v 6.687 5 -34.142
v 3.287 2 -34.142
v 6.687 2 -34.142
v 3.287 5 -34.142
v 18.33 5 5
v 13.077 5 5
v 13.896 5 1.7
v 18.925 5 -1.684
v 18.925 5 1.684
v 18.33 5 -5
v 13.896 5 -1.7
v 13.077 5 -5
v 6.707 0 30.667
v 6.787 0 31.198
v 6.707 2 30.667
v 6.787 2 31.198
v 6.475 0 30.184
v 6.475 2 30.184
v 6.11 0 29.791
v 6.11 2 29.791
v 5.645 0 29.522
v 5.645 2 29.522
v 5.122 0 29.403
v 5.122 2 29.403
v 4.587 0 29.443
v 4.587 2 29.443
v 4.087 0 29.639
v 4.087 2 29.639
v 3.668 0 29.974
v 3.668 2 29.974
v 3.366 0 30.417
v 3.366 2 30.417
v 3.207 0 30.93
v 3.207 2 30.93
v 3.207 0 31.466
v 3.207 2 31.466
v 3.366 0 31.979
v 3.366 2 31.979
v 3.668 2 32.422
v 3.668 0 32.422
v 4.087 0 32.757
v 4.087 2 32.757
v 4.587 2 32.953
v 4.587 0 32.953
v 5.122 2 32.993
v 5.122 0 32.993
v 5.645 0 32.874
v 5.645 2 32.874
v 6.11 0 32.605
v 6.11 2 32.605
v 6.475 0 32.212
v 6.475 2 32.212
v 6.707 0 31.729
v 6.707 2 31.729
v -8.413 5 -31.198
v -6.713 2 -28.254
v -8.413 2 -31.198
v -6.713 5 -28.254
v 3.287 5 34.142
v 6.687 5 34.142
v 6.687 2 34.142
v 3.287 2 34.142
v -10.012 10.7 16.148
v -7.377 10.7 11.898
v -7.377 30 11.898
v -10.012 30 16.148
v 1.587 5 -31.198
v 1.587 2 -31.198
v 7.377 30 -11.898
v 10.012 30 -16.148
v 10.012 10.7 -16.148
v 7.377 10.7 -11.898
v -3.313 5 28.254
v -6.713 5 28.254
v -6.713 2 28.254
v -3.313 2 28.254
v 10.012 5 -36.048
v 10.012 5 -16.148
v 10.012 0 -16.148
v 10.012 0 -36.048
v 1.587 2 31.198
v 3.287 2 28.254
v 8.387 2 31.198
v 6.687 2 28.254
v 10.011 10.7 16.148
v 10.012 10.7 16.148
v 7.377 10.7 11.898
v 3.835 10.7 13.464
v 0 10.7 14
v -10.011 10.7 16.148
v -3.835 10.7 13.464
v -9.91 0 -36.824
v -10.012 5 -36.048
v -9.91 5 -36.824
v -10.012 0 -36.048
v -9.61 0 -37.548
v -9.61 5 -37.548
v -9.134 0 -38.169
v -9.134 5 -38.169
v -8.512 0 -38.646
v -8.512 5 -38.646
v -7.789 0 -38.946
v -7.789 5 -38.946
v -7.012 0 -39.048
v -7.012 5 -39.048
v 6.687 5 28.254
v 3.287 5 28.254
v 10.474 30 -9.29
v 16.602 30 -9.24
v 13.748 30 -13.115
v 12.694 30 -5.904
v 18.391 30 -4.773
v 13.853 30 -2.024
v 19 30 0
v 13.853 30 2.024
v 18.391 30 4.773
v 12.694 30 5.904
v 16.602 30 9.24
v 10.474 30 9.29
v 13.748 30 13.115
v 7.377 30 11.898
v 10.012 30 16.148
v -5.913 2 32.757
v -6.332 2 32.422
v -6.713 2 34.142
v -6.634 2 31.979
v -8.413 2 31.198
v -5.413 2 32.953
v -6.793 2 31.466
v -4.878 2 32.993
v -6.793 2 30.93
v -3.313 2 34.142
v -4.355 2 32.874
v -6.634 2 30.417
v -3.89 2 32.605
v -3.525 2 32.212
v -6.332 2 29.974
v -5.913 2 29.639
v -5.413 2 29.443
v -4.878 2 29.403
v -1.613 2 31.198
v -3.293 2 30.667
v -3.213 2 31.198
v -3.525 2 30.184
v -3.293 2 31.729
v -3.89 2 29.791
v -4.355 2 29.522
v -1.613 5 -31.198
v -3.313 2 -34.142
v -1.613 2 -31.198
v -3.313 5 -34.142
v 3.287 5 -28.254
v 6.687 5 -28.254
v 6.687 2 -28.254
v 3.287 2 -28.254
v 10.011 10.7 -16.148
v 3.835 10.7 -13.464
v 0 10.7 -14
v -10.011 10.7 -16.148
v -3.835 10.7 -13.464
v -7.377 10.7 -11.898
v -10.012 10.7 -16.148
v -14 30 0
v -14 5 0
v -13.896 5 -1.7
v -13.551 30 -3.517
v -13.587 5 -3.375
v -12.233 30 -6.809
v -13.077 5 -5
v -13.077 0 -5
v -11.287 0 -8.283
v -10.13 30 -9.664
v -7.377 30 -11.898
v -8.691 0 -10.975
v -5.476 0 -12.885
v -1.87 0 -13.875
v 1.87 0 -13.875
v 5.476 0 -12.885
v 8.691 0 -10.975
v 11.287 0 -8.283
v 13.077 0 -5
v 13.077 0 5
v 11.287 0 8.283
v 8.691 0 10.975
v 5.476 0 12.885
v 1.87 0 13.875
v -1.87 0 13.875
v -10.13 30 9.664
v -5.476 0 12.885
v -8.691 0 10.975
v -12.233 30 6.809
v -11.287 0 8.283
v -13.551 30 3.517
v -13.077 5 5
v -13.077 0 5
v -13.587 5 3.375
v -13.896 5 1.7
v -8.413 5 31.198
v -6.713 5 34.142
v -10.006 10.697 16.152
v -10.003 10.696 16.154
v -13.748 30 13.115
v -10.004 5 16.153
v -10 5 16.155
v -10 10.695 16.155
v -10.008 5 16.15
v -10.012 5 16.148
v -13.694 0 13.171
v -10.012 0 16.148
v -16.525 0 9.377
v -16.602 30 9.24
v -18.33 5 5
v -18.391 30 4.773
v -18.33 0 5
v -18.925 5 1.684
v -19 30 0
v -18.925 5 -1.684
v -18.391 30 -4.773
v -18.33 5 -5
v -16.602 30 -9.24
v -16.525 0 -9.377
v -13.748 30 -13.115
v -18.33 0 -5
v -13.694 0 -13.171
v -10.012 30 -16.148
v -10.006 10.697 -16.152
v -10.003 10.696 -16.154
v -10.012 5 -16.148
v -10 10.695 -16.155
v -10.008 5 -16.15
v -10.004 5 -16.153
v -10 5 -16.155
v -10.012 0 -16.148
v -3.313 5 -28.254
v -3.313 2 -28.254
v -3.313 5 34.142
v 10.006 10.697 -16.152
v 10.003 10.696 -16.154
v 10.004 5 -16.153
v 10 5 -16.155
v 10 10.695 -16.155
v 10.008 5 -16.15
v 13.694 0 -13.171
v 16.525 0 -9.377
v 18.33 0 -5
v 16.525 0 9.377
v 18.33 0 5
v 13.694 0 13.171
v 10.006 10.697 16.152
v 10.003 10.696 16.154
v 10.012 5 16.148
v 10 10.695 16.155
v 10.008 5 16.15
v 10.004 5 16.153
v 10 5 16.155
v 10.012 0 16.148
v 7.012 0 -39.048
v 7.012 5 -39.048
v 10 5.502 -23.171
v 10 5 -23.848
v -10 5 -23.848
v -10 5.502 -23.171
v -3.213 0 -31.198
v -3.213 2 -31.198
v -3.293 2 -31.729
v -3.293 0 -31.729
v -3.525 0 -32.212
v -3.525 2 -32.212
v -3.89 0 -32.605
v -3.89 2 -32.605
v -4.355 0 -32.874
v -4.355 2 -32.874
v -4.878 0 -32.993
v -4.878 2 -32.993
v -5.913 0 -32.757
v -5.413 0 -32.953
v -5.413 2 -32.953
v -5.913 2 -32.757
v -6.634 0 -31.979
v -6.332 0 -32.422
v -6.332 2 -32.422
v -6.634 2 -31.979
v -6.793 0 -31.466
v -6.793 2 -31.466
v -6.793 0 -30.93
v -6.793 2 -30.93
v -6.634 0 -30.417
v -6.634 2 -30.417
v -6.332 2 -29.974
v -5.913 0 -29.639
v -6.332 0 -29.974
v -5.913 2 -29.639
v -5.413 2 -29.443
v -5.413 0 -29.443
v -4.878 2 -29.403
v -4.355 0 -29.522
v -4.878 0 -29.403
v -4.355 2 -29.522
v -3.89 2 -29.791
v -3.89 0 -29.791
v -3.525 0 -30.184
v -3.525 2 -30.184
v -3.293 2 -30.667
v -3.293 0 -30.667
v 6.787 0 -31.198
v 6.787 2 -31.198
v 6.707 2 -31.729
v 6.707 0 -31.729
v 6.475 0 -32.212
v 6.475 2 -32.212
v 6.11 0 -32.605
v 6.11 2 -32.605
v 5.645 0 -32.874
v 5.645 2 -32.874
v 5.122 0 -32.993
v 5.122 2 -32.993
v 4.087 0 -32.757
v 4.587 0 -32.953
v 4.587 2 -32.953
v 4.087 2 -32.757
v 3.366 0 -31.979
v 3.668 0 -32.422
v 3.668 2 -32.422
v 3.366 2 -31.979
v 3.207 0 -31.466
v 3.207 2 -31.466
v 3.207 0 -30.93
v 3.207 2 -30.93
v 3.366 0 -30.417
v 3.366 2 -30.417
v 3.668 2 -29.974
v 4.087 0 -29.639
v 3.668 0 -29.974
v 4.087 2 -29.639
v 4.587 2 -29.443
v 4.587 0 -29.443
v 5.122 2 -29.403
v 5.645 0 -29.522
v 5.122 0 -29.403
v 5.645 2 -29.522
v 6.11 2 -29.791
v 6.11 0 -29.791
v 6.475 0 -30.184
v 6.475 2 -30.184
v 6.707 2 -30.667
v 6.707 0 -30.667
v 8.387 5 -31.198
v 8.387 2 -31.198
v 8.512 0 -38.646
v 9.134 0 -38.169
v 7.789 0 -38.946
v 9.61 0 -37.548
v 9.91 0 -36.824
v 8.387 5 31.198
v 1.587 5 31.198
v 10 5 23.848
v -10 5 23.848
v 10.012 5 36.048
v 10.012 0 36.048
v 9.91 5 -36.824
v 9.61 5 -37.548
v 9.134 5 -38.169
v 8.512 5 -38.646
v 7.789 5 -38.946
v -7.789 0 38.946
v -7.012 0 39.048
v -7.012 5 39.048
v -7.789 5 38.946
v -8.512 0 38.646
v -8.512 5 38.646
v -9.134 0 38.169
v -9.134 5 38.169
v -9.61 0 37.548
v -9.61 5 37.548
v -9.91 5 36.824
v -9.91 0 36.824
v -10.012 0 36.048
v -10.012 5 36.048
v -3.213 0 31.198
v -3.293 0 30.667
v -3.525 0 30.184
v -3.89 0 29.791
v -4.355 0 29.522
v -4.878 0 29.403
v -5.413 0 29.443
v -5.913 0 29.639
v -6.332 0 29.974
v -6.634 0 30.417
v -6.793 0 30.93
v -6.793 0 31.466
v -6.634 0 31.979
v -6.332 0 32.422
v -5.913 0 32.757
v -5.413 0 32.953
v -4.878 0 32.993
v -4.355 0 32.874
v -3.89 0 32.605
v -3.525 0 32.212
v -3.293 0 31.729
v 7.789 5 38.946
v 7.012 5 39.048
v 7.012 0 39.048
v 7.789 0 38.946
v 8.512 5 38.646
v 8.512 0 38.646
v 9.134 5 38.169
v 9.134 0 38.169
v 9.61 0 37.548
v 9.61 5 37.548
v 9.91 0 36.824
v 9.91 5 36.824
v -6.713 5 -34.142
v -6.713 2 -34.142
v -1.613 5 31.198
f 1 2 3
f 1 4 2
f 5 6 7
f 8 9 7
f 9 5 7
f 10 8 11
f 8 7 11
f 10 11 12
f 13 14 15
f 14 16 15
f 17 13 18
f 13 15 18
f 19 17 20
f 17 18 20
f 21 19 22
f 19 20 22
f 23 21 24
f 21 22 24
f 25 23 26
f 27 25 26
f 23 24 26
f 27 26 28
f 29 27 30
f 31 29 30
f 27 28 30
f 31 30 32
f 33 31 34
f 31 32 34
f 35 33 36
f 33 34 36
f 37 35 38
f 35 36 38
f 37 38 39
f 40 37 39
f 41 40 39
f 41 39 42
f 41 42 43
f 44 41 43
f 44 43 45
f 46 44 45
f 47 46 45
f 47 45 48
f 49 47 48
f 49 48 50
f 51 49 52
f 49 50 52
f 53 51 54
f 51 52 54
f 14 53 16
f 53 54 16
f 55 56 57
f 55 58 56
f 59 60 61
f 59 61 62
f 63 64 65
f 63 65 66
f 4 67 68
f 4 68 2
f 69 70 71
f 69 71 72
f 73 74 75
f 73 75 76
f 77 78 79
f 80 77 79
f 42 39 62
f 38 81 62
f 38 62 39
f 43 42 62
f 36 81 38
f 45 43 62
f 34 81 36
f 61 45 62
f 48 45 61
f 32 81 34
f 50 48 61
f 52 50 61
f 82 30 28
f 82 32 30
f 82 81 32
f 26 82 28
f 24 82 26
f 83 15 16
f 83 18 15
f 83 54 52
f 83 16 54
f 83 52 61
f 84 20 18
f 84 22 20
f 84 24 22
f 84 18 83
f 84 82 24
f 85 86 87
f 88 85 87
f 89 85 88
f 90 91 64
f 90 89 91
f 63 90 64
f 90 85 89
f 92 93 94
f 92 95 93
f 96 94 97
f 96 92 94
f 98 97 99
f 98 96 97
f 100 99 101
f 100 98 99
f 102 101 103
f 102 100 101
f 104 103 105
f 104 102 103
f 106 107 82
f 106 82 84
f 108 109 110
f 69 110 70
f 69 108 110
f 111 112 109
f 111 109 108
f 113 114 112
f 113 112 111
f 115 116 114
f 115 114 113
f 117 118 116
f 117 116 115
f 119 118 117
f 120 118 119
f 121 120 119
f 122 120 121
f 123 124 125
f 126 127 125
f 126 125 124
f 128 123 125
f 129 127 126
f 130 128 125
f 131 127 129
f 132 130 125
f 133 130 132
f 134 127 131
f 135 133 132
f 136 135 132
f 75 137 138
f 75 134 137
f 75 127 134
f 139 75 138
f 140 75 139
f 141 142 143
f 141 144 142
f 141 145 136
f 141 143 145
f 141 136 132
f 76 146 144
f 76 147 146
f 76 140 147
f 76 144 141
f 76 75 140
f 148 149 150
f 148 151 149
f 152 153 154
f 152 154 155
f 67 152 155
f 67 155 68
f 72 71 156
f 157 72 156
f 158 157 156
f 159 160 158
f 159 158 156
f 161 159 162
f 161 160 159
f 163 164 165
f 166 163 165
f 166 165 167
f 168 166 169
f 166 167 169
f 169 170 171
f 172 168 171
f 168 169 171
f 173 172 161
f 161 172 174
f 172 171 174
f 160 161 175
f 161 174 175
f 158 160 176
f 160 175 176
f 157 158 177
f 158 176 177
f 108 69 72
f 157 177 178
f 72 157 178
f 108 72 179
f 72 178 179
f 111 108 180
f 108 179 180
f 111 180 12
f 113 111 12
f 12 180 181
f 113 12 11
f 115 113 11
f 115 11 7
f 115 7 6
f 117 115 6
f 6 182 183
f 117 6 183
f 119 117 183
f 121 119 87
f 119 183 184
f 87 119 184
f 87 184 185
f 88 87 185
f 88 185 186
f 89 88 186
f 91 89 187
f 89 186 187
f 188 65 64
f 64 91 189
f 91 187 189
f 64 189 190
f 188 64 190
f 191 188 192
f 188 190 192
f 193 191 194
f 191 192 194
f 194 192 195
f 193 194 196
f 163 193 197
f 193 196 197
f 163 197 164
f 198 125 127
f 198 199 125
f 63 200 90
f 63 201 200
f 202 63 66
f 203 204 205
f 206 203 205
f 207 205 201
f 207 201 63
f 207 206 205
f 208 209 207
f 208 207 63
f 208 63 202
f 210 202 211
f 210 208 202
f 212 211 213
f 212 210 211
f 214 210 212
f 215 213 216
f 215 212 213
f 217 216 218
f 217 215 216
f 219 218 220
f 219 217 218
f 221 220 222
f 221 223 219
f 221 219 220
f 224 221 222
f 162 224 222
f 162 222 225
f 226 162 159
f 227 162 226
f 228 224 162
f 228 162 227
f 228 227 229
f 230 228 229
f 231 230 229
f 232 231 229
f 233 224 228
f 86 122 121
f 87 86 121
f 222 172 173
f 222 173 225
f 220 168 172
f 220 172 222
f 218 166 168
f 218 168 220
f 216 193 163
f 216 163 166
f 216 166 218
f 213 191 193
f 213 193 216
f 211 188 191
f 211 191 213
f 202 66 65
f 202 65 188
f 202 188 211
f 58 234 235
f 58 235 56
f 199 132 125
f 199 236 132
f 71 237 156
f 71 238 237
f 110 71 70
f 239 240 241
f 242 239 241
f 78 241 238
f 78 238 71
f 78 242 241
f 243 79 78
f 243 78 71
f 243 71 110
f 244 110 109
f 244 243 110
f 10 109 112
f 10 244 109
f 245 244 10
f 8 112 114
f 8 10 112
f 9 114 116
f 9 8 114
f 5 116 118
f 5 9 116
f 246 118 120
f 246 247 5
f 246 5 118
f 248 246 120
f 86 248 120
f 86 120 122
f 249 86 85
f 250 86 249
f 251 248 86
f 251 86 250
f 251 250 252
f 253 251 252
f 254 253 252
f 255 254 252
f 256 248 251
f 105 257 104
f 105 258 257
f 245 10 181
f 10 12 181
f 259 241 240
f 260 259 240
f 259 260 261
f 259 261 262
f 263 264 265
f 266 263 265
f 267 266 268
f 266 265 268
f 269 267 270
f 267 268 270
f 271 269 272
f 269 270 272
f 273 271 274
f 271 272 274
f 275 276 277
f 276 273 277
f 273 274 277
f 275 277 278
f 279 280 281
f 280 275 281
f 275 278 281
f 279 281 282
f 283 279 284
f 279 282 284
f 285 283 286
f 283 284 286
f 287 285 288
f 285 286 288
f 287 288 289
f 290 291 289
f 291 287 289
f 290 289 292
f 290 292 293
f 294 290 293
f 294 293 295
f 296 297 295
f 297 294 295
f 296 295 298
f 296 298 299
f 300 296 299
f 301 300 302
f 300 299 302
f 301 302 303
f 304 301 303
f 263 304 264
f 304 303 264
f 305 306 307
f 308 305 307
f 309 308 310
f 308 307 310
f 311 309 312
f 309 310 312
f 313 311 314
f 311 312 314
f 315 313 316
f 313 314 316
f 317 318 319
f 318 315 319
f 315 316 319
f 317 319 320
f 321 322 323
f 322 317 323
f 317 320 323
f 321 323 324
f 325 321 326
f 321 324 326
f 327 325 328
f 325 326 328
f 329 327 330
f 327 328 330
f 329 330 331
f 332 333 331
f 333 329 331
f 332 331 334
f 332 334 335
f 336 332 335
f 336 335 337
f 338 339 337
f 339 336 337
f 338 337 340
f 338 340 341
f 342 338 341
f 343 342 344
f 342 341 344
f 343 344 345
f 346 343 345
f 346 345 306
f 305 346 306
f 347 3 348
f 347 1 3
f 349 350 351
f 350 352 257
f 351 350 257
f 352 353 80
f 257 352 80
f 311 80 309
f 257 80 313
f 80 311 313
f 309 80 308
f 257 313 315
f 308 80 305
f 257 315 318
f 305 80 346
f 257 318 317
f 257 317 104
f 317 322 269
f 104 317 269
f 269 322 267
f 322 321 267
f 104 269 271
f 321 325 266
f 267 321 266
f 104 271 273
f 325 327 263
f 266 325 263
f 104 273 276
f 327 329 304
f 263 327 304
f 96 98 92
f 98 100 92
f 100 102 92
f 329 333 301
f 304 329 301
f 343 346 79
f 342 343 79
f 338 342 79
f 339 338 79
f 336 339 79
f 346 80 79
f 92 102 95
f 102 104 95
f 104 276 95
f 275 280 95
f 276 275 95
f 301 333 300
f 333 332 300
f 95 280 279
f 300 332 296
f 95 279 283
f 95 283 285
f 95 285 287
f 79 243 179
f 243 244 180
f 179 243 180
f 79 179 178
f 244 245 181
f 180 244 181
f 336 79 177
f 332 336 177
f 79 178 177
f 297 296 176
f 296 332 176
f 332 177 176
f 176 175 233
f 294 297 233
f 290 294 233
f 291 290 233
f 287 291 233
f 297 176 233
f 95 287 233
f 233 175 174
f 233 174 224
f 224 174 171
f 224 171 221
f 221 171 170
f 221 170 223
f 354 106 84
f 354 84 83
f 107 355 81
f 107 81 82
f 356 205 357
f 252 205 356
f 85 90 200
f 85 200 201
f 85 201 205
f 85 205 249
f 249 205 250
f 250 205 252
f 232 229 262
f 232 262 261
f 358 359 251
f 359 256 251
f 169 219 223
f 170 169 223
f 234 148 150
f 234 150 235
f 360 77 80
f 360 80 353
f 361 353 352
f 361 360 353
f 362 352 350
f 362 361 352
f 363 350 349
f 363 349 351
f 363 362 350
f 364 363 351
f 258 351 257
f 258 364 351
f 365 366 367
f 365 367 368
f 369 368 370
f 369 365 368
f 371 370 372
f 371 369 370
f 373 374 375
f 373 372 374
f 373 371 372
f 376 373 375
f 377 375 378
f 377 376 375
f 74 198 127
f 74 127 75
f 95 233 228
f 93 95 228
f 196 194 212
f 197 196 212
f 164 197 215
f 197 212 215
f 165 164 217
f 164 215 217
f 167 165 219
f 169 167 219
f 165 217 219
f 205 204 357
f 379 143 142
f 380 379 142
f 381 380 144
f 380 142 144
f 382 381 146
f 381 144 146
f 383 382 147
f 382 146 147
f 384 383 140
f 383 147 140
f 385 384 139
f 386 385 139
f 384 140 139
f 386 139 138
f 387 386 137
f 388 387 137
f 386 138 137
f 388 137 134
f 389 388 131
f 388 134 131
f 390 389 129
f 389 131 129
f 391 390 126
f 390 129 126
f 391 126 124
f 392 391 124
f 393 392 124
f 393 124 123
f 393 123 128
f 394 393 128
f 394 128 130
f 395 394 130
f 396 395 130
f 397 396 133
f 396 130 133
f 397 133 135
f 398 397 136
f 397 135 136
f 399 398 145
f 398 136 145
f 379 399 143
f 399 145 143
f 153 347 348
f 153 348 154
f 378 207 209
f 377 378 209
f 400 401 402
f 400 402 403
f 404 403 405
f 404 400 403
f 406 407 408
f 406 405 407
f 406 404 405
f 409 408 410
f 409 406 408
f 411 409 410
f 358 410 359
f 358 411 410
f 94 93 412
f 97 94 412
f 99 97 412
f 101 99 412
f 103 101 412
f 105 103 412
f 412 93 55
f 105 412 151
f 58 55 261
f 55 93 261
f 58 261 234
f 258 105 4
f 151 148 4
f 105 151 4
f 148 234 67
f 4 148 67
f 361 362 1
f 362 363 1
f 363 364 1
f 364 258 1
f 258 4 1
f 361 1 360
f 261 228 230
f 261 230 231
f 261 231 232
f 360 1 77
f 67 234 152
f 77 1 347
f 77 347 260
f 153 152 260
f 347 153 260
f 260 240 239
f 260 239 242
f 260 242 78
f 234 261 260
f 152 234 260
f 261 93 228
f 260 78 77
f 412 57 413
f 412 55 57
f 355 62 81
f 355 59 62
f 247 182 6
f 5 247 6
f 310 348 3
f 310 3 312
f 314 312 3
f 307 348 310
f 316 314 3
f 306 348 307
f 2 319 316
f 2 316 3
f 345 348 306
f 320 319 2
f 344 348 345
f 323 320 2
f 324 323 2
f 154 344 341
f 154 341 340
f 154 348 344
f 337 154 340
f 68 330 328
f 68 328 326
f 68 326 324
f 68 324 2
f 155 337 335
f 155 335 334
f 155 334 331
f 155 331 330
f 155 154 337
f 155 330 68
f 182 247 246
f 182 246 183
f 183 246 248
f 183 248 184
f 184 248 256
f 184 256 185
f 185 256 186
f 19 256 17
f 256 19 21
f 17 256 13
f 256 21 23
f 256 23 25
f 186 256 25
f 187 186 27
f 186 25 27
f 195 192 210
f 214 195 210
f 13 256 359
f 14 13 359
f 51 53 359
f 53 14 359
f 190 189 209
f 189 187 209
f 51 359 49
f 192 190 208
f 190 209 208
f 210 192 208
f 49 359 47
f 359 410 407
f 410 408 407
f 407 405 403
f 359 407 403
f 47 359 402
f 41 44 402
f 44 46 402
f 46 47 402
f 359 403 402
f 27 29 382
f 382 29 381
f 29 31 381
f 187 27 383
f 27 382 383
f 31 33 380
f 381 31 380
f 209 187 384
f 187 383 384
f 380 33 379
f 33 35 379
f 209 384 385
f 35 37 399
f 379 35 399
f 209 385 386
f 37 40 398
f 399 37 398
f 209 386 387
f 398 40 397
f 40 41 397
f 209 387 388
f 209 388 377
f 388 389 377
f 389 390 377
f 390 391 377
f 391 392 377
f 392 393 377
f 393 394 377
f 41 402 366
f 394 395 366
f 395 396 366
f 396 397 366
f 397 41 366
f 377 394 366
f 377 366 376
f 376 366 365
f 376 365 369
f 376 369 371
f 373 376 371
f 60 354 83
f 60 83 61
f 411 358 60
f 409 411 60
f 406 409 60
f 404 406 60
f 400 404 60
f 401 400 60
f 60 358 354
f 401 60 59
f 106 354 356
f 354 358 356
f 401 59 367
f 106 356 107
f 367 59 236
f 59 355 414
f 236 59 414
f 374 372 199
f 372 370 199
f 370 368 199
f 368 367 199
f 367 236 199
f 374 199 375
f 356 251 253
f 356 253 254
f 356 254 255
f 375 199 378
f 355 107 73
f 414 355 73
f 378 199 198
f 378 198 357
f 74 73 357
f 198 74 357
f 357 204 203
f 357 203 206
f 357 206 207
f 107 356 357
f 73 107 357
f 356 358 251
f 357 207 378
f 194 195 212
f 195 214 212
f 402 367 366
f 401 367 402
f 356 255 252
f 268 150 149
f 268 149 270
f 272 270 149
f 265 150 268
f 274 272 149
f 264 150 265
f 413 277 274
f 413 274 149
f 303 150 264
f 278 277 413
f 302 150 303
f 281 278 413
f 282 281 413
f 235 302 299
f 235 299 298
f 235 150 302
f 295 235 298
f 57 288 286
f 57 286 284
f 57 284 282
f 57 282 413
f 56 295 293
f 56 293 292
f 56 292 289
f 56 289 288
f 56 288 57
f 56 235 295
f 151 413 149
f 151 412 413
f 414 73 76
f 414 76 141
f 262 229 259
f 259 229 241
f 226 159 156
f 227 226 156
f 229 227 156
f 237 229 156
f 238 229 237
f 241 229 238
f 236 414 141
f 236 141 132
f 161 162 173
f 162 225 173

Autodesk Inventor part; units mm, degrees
ref_plane "YZ Plane" through (0, 0, 0) normal (1, 0, 0) x (0, 1, 0)
sketch "Esboço1" plane through (0, 0, 0) normal (0, 1, 0) x (-1, 0, 0)
  circle A0 centre (0, 0) radius 19
  circle A1 centre (0, 0) radius 14
  dimension "d0" = 38
  dimension "d1" = 28
extrude "Extrusão1" add sketch "Esboço1" along normal blind 30
sketch "Esboço2" plane through (0, 0, 0) normal (1, 0, 0) x (0, 1, 0)
  line L0 (-5, 5) -> (5, 5)
  line L1 (5, 5) -> (5, -5)
  line L2 (5, -5) -> (-5, -5)
  line L3 (-5, -5) -> (-5, 5)
  line L4 (-5, 5) -> (5, -5) construction
  line L5 (5, 5) -> (-5, -5) construction
  point P0 (0, 0)
  dimension "d4" = 10
  dimension "d5" = 10
extrude "Extrusão2" cut sketch "Esboço2" along normal mid plane 40
sketch "Esboço3" plane through (0, 0, 0) normal (0, 0, 1) x (1, 0, 0)
  point P0 (0, 0)
ref_plane "Plano de trabalho1" through (0, 30, 0) normal (0, 1, 0) x (-1, 0, 0)
sketch "Esboço4" plane through (0, 30, 0) normal (0, 1, 0) x (-1, 0, 0)
  circle A0 centre (0, 0) radius 19 projected
  line L0 (10.0122, 16.148) -> (-10.0122, -16.148) construction
  line L1 (-10.0122, 16.148) -> (10.0122, -16.148) construction
  circle A1 centre (0, 0) radius 14 projected
  line L2 (7.3774, 11.8985) -> (-7.3774, -11.8985) construction
  line L3 (-7.3774, 11.8985) -> (7.3774, -11.8985) construction
  line L4 (10.0122, -16.148) -> (7.3774, -11.8985)
  line L5 (-10.0122, -16.148) -> (-7.3774, -11.8985)
  line L6 (-10.0122, 16.148) -> (-7.3774, 11.8985)
  line L7 (7.3774, 11.8985) -> (10.0122, 16.148)
  arc A2 (-10.0122, -16.148) -> (10.0122, -16.148) centre (0, 0) ccw
  arc A3 (10.0122, 16.148) -> (-10.0122, 16.148) centre (0, 0) ccw
  arc A4 (7.3774, 11.8985) -> (-7.3774, 11.8985) centre (0, 0) ccw
  arc A5 (-7.3774, -11.8985) -> (7.3774, -11.8985) centre (0, 0) ccw
extrude "Extrusão3" cut sketch "Esboço4" against normal blind 19.3 contours L7 A1 L6 A0 | A0 L5 A1 L4
sketch "Esboço5" plane through (0, 30, 0) normal (0, 1, 0) x (-1, 0, 0)
  point P0 (0, 0)
ref_plane "Plano de trabalho4" through (0, 0, 19) normal (0, 0, 1) x (1, 0, 0)
sketch "Esboço6" plane through (0, 0, 19) normal (0, 0, 1) x (1, 0, 0)
  line L0 (-10.0122, 10.7) -> (-7.3774, 10.7) projected
  line L1 (7.3774, 10.7) -> (10.0122, 10.7) projected
  line L2 (13.0767, 0) -> (-13.0767, 0) projected
  line L3 (10.0122, 0) -> (-10.0122, 0)
  line L4 (-10.0122, 0) -> (10.0122, 0)
  line L5 (10.0122, 0) -> (10.0122, 5)
  line L6 (10.0122, 5) -> (-10.0122, 5)
  line L7 (-10.0122, 5) -> (-10.0122, 0)
  point P0 (0, 0)
  dimension "d20" = 5
extrude "Extrusão4" add sketch "Esboço6" along normal blind 20.048 and the other way blind 3
fillet "Arredondamento1" radius 3 2 edges at (-10.0122, 2.5, 39.048) (10.0122, 2.5, 39.048)
sketch "Esboço7" plane through (0, 0, 0) normal (1, 0, 0) x (0, 1, 0)
  line L0 (10.7, 16.148) -> (10.7, 11.8985) projected
  line L1 (5, 36.048) -> (5, 16.148) projected
  line L2 (10.7, 16.148) -> (5, 16.148)
  line L3 (5, 16.148) -> (5, 23.848)
  line L4 (5, 23.848) -> (10.7, 23.848)
  line L5 (10.7, 23.848) -> (10.7, 16.148)
  point P0 (0, 0)
  dimension "d28" = 7.7
extrude "Extrusão5" add sketch "Esboço7" along normal mid plane 20
chamfer "Chanfro1" distance 5.7 distance2 7.7 1 edges at (0, 10.7, 23.848) measured on face at (-3.3333, 6.9, 23.848)
sketch "Esboço8" plane through (-7.0122, 5, 39.048) normal (0, 1, 0) x (1, 0, 0)
  line L0 (0, 0) -> (14.0243, 0) projected
  line L1 (1.9995, 0) -> (1.9995, 7.85) construction
  line L2 (5.3995, 7.85) -> (3.6995, 4.9055)
  line L3 (3.6995, 4.9055) -> (0.2995, 4.9055)
  line L4 (0.2995, 4.9055) -> (-1.4005, 7.85)
  line L5 (-1.4005, 7.85) -> (0.2995, 10.7945)
  line L6 (0.2995, 10.7945) -> (3.6995, 10.7945)
  line L7 (3.6995, 10.7945) -> (5.3995, 7.85)
  line L8 (5.3995, 7.85) -> (8.5995, 7.85) construction
  line L9 (11.9995, 0) -> (11.9995, 7.85) construction
  line L10 (15.3995, 7.85) -> (13.6995, 4.9055)
  line L11 (13.6995, 4.9055) -> (10.2995, 4.9055)
  line L12 (10.2995, 4.9055) -> (8.5995, 7.85)
  line L13 (8.5995, 7.85) -> (10.2995, 10.7945)
  line L14 (10.2995, 10.7945) -> (13.6995, 10.7945)
  line L15 (13.6995, 10.7945) -> (15.3995, 7.85)
  line L16 (-1.4005, 7.85) -> (-3.0005, 7.85) construction
  line L17 (15.3995, 7.85) -> (16.9995, 7.85) construction
  line L18 (17.0243, 3) -> (17.0243, 22.9) projected
  line L19 (-3, 3) -> (-3, 22.9) projected
  line L20 (-3, 22.9) -> (-3, 3) projected
  point P0 (7.0122, 39.048)
  point P1 (-3, 7.85)
  dimension "d37" = 7.85
  dimension "d38" = 3.4
  dimension "d39" = 3.2
  dimension "d40" = 7.85
  dimension "d41" = 3.4
  dimension "d43" = 16.8
  dimension "d44" = 1.6
  dimension "d45" = 1.6
ref_plane "Plano de trabalho5" through (0, 0, 16.148) normal (0, 0, 1) x (1, 0, 0)
extrude "Extrusão6" cut sketch "Esboço8" against normal blind 3
sketch "Esboço9" plane through (-7.0122, 2, 39.048) normal (0, 1, 0) x (1, 0, 0)
  line L0 (0.2995, 10.7945) -> (3.6995, 10.7945) construction
  line L1 (5.3995, 7.85) -> (3.6995, 4.9055) projected
  line L2 (3.6995, 10.7945) -> (5.3995, 7.85) projected
  line L3 (0.2995, 10.7945) -> (3.6995, 10.7945) projected
  line L4 (-1.4005, 7.85) -> (0.2995, 10.7945) projected
  line L5 (0.2995, 4.9055) -> (-1.4005, 7.85) projected
  line L6 (3.6995, 4.9055) -> (0.2995, 4.9055) projected
  line L7 (3.6995, 10.7945) -> (0.2995, 4.9055) construction
  line L8 (0.2995, 10.7945) -> (3.6995, 4.9055) construction
  circle A0 centre (1.9995, 7.85) radius 1.8
  line L9 (15.3995, 7.85) -> (13.6995, 4.9055) construction
  line L10 (13.6995, 10.7945) -> (15.3995, 7.85) construction
  line L11 (10.2995, 10.7945) -> (13.6995, 10.7945) construction
  line L12 (8.5995, 7.85) -> (10.2995, 10.7945) construction
  line L13 (10.2995, 4.9055) -> (8.5995, 7.85) construction
  line L14 (13.6995, 4.9055) -> (10.2995, 4.9055) construction
  line L15 (13.6995, 10.7945) -> (10.2995, 4.9055) construction
  line L16 (10.2995, 10.7945) -> (13.6995, 4.9055) construction
  circle A1 centre (11.9995, 7.85) radius 1.8
  point P0 (7.0122, 39.048)
  dimension "d49" = 3.6
  dimension "d50" = 3.6
extrude "Extrusão7" cut sketch "Esboço9" against normal up to next contours A0 | A1
mirror "Espelhamento1" about plane through (0, 0, 0) normal (0, 0, 1) of "Extrusão4", "Arredondamento1", "Extrusão5", "Chanfro1", "Extrusão6", "Extrusão7"
sketch "Esboço11" plane through (-10, 5, -16.1555) normal (-1, 0, 0) x (0, 0, 1)
  line L0 (0, 5.6944) -> (-7.6925, 0) projected
  line L1 (0, 5.7) -> (-7.6925, 5.7)
  line L2 (-7.6925, 5.7) -> (-7.6925, 0)
  line L3 (-7.6925, 0) -> (0, 5.7)
  point P0 (16.1555, -5)
  point P1 (0, 0)
extrude "Extrusão9" cut sketch "Esboço11" against normal blind 20
sketch "Esboço12" plane through (0, 0, 0) normal (0, -1, 0) x (1, 0, 0)
  circle A0 centre (-5.0126, 31.198) radius 1.8 projected
  circle A1 centre (4.9874, 31.198) radius 1.8 projected
  circle A2 centre (4.9874, -31.198) radius 1.8 projected
  circle A3 centre (-5.0126, -31.198) radius 1.8 projected
  point P0 (0, 0)
properties part number "SuporteMotor"
